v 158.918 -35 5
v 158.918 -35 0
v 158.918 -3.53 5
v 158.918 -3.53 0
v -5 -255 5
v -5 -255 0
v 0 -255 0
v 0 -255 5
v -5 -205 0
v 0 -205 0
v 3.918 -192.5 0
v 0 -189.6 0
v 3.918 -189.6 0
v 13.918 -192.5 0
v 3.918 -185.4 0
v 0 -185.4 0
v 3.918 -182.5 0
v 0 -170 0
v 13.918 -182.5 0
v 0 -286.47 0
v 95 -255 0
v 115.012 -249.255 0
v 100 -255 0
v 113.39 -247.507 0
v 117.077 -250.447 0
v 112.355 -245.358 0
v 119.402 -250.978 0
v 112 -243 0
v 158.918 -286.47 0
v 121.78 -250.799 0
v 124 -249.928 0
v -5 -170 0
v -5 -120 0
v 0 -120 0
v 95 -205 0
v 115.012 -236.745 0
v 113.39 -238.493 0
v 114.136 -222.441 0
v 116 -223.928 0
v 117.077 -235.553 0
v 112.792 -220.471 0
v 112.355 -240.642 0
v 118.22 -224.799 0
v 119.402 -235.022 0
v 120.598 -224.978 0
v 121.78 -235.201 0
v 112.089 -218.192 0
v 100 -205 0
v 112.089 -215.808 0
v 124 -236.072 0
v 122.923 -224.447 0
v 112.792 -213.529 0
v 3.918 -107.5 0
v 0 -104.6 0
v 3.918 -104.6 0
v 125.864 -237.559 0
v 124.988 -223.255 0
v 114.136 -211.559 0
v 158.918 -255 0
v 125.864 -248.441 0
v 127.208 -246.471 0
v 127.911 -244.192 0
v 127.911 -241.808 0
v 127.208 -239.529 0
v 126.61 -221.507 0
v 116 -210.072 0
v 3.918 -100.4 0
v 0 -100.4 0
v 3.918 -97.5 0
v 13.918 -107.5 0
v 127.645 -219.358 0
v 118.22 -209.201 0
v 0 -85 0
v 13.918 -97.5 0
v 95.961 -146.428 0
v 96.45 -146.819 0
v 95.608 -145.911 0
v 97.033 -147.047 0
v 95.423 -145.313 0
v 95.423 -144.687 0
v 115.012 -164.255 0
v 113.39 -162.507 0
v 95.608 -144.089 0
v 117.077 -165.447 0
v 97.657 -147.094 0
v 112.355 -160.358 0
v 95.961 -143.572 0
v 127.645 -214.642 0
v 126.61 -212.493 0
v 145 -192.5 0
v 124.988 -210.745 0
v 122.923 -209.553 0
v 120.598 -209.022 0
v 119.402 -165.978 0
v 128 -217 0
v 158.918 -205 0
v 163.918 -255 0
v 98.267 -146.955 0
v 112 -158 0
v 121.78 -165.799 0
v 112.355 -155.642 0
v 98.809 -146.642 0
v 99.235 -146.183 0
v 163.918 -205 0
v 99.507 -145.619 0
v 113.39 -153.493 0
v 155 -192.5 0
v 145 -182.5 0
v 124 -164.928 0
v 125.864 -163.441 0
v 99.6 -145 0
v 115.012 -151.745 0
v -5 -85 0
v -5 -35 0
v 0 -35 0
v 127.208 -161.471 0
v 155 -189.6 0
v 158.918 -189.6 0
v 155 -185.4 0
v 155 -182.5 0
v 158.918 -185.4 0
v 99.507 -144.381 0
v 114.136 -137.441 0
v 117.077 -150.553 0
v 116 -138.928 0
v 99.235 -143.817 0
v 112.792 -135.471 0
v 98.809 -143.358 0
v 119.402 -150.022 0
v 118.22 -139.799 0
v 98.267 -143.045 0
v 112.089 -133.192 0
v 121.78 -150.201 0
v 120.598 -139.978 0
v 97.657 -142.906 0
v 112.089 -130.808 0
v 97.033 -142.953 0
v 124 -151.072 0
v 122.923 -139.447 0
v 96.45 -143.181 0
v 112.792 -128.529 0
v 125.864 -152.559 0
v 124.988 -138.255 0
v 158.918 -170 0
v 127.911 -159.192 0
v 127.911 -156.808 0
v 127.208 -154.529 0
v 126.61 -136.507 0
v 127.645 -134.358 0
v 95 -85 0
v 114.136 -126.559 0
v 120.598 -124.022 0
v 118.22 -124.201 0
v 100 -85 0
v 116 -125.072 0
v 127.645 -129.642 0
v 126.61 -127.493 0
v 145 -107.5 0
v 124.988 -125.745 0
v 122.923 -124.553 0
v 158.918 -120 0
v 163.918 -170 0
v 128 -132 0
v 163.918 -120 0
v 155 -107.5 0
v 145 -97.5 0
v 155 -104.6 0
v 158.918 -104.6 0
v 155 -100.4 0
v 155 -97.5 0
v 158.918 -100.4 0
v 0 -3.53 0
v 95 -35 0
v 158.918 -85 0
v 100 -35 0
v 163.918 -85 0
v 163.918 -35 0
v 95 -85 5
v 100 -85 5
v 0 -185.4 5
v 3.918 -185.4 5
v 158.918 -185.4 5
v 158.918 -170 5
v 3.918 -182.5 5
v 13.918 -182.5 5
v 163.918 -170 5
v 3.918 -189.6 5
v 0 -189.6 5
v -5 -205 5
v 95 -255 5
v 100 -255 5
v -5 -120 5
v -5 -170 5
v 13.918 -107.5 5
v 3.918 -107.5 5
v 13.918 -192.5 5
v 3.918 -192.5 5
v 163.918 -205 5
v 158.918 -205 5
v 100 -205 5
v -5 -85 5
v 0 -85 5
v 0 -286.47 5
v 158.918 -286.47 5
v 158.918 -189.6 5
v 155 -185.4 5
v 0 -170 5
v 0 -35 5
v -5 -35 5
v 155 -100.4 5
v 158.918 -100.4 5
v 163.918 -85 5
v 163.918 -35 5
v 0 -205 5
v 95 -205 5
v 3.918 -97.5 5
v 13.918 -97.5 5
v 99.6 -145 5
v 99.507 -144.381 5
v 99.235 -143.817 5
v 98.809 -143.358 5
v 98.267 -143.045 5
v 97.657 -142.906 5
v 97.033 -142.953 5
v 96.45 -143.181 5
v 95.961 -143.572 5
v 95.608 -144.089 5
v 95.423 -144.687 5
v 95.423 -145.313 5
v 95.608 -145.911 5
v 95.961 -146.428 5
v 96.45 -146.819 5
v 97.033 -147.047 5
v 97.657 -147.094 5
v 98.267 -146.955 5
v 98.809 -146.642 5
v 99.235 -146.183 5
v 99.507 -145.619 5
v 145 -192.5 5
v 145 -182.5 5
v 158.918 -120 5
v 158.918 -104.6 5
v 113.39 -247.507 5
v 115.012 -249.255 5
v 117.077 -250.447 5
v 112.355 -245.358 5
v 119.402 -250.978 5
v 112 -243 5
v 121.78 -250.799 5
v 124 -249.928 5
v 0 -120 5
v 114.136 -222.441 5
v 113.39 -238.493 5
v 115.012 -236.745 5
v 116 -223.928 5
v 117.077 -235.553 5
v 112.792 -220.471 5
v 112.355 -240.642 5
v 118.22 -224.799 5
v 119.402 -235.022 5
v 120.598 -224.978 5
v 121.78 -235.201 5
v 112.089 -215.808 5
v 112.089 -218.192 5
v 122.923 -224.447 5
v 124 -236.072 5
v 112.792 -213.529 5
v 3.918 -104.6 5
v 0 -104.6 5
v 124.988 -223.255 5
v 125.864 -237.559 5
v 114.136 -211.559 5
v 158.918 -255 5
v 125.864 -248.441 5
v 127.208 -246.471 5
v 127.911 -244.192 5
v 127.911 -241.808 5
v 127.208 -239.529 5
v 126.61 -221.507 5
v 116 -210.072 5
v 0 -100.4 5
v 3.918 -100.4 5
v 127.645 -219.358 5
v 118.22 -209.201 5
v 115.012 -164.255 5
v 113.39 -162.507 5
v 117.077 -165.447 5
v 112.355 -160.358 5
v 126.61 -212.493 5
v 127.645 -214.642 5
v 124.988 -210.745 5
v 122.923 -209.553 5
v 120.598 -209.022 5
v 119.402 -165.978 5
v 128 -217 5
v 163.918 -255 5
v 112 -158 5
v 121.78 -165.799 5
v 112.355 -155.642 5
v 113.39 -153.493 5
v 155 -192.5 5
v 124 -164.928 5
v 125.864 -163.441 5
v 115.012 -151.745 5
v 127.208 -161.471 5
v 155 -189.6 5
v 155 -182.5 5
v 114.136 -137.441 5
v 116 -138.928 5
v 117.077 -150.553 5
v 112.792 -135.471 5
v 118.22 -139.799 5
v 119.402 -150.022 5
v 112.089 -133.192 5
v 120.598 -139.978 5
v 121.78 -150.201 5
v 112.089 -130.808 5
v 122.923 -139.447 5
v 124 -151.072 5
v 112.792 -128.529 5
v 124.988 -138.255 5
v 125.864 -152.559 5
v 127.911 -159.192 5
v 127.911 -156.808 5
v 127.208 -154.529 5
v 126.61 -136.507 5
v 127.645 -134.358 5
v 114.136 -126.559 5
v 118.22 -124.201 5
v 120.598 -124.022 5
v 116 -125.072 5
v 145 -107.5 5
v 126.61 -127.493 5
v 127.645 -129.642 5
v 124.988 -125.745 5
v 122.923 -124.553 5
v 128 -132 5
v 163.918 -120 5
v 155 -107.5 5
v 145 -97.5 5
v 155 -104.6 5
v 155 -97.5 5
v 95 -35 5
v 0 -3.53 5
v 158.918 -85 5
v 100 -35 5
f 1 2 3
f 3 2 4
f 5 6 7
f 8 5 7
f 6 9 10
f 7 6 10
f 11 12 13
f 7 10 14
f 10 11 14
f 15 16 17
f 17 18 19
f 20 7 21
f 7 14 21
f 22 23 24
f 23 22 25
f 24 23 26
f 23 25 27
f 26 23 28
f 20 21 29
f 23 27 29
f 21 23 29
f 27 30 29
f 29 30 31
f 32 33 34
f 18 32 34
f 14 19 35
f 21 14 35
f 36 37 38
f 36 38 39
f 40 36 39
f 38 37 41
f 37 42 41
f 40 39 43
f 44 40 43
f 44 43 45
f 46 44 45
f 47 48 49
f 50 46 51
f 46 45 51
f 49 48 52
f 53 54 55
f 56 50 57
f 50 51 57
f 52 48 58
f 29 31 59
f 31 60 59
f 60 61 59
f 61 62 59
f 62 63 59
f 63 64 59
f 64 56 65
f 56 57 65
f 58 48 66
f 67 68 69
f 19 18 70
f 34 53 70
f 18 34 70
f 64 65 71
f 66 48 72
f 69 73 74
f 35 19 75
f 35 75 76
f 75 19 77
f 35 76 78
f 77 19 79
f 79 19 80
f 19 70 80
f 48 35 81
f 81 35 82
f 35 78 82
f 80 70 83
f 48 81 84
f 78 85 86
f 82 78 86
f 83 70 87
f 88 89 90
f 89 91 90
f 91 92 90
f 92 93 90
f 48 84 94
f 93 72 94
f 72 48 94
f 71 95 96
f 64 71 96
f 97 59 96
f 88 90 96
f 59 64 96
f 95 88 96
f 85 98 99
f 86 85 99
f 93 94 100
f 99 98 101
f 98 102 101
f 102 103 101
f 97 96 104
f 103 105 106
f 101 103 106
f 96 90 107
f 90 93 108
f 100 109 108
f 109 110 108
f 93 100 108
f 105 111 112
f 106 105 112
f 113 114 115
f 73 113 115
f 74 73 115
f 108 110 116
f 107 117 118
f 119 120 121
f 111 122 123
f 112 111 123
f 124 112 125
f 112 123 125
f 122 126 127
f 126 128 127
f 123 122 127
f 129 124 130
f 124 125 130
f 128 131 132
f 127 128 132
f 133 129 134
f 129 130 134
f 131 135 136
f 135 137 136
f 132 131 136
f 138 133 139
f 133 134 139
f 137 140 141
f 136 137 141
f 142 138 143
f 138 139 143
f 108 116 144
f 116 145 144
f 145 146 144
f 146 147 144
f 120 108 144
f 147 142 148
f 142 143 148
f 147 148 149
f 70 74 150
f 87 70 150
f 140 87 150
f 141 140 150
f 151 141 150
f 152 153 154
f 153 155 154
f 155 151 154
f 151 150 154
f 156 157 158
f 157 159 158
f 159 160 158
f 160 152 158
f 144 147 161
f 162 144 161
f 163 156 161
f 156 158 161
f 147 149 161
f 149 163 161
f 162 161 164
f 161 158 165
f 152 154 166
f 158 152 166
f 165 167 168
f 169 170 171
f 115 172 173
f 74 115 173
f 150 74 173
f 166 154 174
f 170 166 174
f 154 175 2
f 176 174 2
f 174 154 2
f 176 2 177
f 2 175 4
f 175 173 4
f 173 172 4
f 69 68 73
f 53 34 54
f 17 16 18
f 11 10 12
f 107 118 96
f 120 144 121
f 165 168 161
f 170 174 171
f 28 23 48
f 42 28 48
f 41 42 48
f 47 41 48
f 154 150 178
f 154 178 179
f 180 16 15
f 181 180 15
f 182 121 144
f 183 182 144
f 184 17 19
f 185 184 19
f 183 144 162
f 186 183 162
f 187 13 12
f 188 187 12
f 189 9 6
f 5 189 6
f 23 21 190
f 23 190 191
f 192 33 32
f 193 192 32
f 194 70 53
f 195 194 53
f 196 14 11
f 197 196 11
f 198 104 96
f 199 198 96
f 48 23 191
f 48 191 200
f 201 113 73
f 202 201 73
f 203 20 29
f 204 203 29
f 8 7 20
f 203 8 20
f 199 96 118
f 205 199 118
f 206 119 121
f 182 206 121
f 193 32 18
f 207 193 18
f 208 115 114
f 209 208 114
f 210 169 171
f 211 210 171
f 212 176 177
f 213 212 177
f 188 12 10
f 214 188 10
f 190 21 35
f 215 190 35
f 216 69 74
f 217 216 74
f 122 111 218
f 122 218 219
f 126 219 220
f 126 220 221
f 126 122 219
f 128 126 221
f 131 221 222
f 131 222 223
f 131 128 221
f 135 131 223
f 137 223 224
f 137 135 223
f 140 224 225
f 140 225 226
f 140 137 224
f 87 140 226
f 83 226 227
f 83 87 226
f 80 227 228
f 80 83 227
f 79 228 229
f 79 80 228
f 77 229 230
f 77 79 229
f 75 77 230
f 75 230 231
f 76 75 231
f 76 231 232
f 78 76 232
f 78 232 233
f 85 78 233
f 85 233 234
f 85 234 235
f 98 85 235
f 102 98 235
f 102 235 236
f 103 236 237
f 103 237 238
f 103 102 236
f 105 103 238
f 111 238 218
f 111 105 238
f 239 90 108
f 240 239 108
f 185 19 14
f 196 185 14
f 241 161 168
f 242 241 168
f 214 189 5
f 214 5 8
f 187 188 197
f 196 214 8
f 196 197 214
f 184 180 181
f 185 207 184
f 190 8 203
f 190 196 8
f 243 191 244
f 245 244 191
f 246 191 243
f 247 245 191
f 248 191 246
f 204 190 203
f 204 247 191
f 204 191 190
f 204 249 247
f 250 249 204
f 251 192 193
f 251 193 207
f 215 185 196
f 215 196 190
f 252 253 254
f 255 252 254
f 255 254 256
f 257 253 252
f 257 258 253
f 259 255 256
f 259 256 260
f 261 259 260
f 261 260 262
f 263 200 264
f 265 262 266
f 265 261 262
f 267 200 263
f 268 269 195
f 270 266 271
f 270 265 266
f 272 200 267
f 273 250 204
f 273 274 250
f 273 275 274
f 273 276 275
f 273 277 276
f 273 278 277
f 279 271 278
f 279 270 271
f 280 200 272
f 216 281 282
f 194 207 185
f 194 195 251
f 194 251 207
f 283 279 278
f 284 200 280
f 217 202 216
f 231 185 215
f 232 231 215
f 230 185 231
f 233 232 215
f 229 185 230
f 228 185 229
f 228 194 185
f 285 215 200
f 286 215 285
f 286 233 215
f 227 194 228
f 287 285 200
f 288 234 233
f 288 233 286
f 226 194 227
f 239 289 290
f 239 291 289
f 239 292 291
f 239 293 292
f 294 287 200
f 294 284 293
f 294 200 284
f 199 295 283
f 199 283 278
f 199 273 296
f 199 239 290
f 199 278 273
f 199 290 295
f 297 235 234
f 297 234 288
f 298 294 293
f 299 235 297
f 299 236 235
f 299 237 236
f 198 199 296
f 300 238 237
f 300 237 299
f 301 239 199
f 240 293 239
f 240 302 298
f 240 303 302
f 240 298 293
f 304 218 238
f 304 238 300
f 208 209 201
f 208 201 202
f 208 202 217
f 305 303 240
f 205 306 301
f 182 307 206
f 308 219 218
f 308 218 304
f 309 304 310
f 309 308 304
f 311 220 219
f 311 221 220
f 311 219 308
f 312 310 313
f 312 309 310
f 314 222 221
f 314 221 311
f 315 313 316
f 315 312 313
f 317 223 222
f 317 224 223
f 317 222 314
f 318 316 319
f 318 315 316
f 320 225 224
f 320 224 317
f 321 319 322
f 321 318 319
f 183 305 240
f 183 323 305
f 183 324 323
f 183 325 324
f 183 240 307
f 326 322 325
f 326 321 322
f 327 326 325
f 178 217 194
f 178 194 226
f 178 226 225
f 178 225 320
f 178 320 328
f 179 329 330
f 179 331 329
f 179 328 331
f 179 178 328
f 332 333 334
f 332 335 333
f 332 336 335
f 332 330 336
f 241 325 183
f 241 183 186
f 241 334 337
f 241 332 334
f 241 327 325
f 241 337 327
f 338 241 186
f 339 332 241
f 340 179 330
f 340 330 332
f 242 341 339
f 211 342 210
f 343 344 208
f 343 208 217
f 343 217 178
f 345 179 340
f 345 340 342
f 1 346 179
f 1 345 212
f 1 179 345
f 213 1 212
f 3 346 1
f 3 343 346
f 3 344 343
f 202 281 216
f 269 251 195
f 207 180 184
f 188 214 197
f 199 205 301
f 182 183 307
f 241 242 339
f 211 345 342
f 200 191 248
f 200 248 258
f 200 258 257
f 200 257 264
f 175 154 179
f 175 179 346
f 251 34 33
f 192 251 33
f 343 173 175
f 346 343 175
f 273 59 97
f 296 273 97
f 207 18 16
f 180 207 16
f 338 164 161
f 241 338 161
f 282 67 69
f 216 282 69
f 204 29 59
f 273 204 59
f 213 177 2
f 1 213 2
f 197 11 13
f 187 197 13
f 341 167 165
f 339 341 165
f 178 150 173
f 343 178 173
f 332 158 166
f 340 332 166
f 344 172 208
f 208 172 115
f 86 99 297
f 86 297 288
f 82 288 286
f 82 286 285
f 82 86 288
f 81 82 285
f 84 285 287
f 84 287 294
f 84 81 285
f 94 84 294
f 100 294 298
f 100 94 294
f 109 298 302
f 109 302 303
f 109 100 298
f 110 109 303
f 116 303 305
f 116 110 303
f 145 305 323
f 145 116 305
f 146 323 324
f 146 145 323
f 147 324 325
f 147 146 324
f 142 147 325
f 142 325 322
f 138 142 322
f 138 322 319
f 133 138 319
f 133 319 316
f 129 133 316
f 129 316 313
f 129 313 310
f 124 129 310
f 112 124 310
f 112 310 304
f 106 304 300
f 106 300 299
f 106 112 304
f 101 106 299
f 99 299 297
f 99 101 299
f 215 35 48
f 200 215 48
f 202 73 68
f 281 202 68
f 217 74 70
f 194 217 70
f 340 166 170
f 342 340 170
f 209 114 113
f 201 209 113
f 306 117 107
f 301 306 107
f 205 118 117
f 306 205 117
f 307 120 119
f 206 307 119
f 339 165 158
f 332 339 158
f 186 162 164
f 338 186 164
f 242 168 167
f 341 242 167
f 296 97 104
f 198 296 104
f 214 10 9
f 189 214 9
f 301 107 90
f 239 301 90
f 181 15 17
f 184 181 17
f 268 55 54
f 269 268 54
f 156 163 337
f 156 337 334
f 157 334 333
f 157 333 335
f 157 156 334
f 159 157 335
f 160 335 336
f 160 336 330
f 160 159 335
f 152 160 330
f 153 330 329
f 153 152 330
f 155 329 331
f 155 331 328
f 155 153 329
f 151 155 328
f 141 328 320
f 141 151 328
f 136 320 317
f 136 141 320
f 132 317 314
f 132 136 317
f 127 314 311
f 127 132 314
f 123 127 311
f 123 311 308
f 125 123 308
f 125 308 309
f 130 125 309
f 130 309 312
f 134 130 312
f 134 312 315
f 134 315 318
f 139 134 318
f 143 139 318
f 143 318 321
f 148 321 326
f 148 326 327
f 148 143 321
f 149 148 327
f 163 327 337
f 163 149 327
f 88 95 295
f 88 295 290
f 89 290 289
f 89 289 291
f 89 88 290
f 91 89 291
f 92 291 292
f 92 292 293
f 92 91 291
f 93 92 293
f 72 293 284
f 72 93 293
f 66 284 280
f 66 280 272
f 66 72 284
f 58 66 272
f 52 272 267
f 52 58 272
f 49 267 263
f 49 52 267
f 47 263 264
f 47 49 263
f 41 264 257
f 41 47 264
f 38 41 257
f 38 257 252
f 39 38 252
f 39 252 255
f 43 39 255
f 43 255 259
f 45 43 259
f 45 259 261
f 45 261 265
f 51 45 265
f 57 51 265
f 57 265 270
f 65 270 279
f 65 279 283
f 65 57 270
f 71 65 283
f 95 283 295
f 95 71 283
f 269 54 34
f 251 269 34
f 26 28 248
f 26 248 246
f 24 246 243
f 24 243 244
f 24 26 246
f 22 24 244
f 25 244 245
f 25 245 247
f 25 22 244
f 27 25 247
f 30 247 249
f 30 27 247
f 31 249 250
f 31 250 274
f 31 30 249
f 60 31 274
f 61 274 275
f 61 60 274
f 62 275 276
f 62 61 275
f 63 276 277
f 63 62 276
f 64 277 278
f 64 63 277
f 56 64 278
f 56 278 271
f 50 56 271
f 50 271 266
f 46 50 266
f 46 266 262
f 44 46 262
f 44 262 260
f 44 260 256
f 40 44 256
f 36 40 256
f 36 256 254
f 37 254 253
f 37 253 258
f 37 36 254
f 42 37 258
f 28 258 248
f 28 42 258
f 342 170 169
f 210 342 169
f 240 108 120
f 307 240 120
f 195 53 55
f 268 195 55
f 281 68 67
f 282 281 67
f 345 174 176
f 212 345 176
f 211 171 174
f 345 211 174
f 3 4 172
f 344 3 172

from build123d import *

# Parameters (mm, degrees)
ESQUISSE1_R        = 2.1
ESQUISSE1_R_2      = 8
ESQUISSE1_W        = 5
ESQUISSE1_H        = 50
BOSS_EXTRU_1_DEPTH = 5


with BuildPart() as part:
    # Esquisse1 → Boss.-Extru.1 (new body)
    with BuildSketch(Plane.XY):
        Polygon((0, -3.53), (0, -35), (-5, -35), (-5, -85), (0, -85), (0, -100.4), (3.918484905, -100.4), (3.918484905, -97.5), (13.918484905, -97.5), (13.918484905, -107.5), (3.918484905, -107.5), (3.918484905, -104.6), (0, -104.6), (0, -120), (-5, -120), (-5, -170), (0, -170), (0, -185.4), (3.918484905, -185.4), (3.918484905, -182.5), (13.918484905, -182.5), (13.918484905, -192.5), (3.918484905, -192.5), (3.918484905, -189.6), (0, -189.6), (0, -205), (-5, -205), (-5, -255), (0, -255), (0, -286.47), (158.918484905, -286.47), (158.918484905, -255), (163.918484905, -255), (163.918484905, -205), (158.918484905, -205), (158.918484905, -189.6), (155, -189.6), (155, -192.5), (145, -192.5), (145, -182.5), (155, -182.5), (155, -185.4), (158.918484905, -185.4), (158.918484905, -170), (163.918484905, -170), (163.918484905, -120), (158.918484905, -120), (158.918484905, -104.6), (155, -104.6), (155, -107.5), (145, -107.5), (145, -97.5), (155, -97.5), (155, -100.4), (158.918484905, -100.4), (158.918484905, -85), (163.918484905, -85), (163.918484905, -35), (158.918484905, -35), (158.918484905, -3.53), align=None)
        with Locations((97.5, -145)):
            Circle(ESQUISSE1_R, mode=Mode.SUBTRACT)
        with Locations((120, -132)):
            Circle(ESQUISSE1_R_2, mode=Mode.SUBTRACT)
        with Locations(Location((120, -158, 0), (0, 0, 180))):
            Circle(ESQUISSE1_R_2, mode=Mode.SUBTRACT)
        with Locations((120, -217)):
            Circle(ESQUISSE1_R_2, mode=Mode.SUBTRACT)
        with Locations(Location((120, -243, 0), (0, 0, 180))):
            Circle(ESQUISSE1_R_2, mode=Mode.SUBTRACT)
        with Locations((97.5, -60)):
            Rectangle(ESQUISSE1_W, ESQUISSE1_H, mode=Mode.SUBTRACT)
        with Locations((97.5, -230)):
            Rectangle(ESQUISSE1_W, ESQUISSE1_H, mode=Mode.SUBTRACT)
    extrude(amount=BOSS_EXTRU_1_DEPTH)


solid = part.part
